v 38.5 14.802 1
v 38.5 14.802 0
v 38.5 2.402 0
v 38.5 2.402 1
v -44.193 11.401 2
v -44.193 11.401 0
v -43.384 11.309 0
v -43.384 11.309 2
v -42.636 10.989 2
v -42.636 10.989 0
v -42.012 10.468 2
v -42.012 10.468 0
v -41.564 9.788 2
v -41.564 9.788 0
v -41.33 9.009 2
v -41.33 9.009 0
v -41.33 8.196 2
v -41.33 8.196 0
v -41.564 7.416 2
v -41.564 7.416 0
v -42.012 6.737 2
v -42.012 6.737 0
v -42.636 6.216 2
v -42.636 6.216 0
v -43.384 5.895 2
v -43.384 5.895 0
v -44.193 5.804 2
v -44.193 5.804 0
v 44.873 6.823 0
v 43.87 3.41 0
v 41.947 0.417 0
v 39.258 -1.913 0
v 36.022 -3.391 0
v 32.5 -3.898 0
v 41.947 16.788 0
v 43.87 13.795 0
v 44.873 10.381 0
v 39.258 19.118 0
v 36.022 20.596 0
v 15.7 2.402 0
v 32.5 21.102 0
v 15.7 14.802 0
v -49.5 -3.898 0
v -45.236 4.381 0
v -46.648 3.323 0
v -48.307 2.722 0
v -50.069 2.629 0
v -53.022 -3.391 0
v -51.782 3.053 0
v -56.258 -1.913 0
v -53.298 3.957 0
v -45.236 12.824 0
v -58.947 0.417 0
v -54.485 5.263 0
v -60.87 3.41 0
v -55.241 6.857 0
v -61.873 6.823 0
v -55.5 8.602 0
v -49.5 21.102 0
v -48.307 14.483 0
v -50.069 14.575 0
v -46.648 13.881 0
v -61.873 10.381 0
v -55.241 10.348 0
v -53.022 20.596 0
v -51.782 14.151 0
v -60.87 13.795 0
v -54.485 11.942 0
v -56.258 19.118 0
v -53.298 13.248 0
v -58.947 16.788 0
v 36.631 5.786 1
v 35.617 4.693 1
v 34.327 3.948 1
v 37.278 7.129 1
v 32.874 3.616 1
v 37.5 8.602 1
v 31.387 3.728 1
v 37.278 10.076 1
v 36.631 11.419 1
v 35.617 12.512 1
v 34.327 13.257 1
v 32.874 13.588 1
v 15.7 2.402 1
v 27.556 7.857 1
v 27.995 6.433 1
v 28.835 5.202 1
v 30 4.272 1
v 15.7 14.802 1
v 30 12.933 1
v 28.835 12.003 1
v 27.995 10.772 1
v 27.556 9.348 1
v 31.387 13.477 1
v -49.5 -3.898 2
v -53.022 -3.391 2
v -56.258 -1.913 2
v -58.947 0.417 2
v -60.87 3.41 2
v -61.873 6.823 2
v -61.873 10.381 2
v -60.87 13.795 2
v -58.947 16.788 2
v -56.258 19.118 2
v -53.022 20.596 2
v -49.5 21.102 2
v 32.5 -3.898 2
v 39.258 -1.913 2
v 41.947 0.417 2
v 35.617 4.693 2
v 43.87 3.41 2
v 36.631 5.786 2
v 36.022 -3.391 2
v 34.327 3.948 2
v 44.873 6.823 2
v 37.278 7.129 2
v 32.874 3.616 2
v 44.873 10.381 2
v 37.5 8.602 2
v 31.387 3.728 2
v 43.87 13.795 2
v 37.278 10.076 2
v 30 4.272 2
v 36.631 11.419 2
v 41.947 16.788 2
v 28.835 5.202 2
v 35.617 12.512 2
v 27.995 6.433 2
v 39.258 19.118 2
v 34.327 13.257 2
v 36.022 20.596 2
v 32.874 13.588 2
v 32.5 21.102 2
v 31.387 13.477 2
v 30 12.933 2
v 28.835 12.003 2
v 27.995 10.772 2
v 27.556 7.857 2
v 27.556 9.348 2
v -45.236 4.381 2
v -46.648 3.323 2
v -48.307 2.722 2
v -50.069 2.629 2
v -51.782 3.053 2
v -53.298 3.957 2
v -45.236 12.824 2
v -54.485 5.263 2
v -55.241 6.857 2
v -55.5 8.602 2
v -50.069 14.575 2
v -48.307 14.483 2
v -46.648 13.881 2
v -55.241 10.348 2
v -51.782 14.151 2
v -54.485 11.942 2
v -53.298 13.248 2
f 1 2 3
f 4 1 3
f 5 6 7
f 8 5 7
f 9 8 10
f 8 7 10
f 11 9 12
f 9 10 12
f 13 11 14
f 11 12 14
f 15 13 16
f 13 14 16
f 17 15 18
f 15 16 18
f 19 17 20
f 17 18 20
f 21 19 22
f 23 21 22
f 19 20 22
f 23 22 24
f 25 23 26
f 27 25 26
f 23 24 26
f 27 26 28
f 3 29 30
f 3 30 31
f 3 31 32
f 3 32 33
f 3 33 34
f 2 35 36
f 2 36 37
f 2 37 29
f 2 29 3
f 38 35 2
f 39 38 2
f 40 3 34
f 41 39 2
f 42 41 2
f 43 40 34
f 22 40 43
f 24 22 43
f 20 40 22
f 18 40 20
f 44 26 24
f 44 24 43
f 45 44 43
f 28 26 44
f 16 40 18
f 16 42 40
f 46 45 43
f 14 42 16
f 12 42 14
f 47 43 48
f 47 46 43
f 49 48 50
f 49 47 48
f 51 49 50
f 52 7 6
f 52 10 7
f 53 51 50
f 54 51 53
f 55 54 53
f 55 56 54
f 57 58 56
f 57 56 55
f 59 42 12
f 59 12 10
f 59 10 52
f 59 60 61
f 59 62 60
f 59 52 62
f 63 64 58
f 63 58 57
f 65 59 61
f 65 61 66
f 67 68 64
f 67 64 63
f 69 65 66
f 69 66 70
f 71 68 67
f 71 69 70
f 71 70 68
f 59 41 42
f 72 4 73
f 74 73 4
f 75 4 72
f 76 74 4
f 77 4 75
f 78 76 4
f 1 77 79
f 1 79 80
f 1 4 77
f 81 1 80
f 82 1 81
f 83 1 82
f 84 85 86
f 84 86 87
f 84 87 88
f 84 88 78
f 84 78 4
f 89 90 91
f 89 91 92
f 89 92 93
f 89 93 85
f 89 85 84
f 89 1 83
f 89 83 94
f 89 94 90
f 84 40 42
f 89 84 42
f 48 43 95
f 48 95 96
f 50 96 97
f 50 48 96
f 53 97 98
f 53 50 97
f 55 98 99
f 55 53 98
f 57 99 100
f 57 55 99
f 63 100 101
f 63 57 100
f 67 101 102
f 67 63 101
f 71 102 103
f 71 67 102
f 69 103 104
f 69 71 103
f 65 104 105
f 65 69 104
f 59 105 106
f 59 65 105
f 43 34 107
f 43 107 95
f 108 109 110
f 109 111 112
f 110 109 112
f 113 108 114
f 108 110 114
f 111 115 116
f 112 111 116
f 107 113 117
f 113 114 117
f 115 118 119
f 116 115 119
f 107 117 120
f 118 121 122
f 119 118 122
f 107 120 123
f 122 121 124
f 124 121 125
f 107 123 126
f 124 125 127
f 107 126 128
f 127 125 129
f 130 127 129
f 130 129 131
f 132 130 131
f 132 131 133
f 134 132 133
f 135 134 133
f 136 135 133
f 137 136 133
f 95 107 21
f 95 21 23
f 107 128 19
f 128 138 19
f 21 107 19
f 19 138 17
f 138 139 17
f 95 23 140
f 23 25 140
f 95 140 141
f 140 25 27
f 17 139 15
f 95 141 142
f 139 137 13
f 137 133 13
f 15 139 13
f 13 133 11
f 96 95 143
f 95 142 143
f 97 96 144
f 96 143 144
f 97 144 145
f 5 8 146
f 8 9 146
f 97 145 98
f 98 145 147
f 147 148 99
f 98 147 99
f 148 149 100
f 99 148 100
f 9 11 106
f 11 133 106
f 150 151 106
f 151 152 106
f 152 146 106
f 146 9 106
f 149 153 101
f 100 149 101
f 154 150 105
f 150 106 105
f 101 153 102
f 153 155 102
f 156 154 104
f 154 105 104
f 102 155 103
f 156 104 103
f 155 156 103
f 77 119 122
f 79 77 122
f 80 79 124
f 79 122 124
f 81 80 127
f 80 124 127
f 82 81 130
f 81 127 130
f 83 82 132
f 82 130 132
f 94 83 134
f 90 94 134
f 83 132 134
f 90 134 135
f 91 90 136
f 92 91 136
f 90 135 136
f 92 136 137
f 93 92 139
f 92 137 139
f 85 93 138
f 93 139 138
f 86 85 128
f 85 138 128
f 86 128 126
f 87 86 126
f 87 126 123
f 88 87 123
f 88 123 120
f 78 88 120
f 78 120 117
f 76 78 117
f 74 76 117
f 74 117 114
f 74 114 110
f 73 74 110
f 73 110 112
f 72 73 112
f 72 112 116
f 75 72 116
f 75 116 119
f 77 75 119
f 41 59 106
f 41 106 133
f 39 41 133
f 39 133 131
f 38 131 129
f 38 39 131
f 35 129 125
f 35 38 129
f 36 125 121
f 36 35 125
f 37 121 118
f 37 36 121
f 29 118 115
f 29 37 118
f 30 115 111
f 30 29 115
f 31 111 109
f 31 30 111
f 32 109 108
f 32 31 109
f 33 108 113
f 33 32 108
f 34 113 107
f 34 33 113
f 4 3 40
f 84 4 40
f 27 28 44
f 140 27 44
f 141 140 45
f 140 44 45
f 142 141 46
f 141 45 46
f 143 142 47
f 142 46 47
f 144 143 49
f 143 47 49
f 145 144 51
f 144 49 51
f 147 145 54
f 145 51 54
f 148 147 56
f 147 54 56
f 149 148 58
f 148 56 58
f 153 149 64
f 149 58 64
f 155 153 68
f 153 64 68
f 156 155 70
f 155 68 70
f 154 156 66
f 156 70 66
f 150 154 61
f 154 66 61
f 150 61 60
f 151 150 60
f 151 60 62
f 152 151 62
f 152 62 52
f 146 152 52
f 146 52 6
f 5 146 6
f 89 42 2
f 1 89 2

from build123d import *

# Parameters (mm, degrees)
SKETCH1_R           = 0.5
BOSS_EXTRUDE1_DEPTH = 2
CUT_EXTRUDE2_DEPTH  = 2
CUT_EXTRUDE3_DEPTH  = 1
SKETCH5_R           = 5
CUT_EXTRUDE4_DEPTH  = 10


with BuildPart() as part:
    # Sketch1 → Boss-Extrude1 (new body)
    with BuildSketch(Plane.XY):
        with BuildLine():
            Line((32.5, -3.897601476), (-49.5, -3.897601476))
            ThreePointArc((-49.5, -3.897601476), (-62, 8.602398524), (-49.5, 21.102398524))
            Line((-49.5, 21.102398524), (32.5, 21.102398524))
            ThreePointArc((32.5, 21.102398524), (45, 8.602398524), (32.5, -3.897601476))
        make_face()
        with Locations((-49.5, 8.602398524)):
            Circle(SKETCH1_R, mode=Mode.SUBTRACT)
        with Locations((32.5, 8.602398524)):
            Circle(SKETCH1_R, mode=Mode.SUBTRACT)
    extrude(amount=BOSS_EXTRUDE1_DEPTH)

    # Sketch3 → Cut-Extrude2 (cut)
    with BuildSketch(Plane(origin=(0, 0, 0), x_dir=(-1, 0, 0), z_dir=(0, 0, -1))):
        with BuildLine():
            ThreePointArc((44.192592593, 11.400867143), (41.3, 8.602398524), (44.192592593, 5.803929905))
            ThreePointArc((44.192592593, 5.803929905), (55.5, 8.602398524), (44.192592593, 11.400867143))
        make_face()
    extrude(amount=-CUT_EXTRUDE2_DEPTH, mode=Mode.SUBTRACT)

    # Sketch4 → Cut-Extrude3 (cut)
    with BuildSketch(Plane(origin=(0, 0, 0), x_dir=(-1, 0, 0), z_dir=(0, 0, -1))):
        with BuildLine():
            ThreePointArc((-33, 8.602398524), (-32.853553391, 8.955951915), (-32.5, 9.102398524))
            Line((-32.5, 9.102398524), (-32.5, 14.802398524))
            Line((-32.5, 14.802398524), (-38.5, 14.802398524))
            Line((-38.5, 14.802398524), (-38.5, 8.602398524))
            Line((-38.5, 8.602398524), (-33, 8.602398524))
        make_face()
        with BuildLine():
            Line((-32.5, 2.402398524), (-32.5, 8.102398524))
            ThreePointArc((-32.5, 8.102398524), (-32.853553391, 8.248845133), (-33, 8.602398524))
            Line((-33, 8.602398524), (-38.5, 8.602398524))
            Line((-38.5, 8.602398524), (-38.5, 2.402398524))
            Line((-38.5, 2.402398524), (-32.5, 2.402398524))
        make_face()
        with BuildLine():
            Line((-32.5, 14.802398524), (-32.5, 9.102398524))
            ThreePointArc((-32.5, 9.102398524), (-32.146446609, 8.955951915), (-32, 8.602398524))
            Line((-32, 8.602398524), (-15.7, 8.602398524))
            Line((-15.7, 8.602398524), (-15.7, 14.802398524))
            Line((-15.7, 14.802398524), (-32.5, 14.802398524))
        make_face()
        with BuildLine():
            ThreePointArc((-32, 8.602398524), (-32.146446609, 8.248845133), (-32.5, 8.102398524))
            Line((-32.5, 8.102398524), (-32.5, 2.402398524))
            Line((-32.5, 2.402398524), (-15.7, 2.402398524))
            Line((-15.7, 2.402398524), (-15.7, 8.602398524))
            Line((-15.7, 8.602398524), (-32, 8.602398524))
        make_face()
    extrude(amount=-CUT_EXTRUDE3_DEPTH, mode=Mode.SUBTRACT)

    # Sketch5 → Cut-Extrude4 (cut)
    with BuildSketch(Plane.XY.offset(2)):
        with Locations((32.5, 8.602398524)):
            Circle(SKETCH5_R)
    extrude(amount=-CUT_EXTRUDE4_DEPTH, mode=Mode.SUBTRACT)


solid = part.part
